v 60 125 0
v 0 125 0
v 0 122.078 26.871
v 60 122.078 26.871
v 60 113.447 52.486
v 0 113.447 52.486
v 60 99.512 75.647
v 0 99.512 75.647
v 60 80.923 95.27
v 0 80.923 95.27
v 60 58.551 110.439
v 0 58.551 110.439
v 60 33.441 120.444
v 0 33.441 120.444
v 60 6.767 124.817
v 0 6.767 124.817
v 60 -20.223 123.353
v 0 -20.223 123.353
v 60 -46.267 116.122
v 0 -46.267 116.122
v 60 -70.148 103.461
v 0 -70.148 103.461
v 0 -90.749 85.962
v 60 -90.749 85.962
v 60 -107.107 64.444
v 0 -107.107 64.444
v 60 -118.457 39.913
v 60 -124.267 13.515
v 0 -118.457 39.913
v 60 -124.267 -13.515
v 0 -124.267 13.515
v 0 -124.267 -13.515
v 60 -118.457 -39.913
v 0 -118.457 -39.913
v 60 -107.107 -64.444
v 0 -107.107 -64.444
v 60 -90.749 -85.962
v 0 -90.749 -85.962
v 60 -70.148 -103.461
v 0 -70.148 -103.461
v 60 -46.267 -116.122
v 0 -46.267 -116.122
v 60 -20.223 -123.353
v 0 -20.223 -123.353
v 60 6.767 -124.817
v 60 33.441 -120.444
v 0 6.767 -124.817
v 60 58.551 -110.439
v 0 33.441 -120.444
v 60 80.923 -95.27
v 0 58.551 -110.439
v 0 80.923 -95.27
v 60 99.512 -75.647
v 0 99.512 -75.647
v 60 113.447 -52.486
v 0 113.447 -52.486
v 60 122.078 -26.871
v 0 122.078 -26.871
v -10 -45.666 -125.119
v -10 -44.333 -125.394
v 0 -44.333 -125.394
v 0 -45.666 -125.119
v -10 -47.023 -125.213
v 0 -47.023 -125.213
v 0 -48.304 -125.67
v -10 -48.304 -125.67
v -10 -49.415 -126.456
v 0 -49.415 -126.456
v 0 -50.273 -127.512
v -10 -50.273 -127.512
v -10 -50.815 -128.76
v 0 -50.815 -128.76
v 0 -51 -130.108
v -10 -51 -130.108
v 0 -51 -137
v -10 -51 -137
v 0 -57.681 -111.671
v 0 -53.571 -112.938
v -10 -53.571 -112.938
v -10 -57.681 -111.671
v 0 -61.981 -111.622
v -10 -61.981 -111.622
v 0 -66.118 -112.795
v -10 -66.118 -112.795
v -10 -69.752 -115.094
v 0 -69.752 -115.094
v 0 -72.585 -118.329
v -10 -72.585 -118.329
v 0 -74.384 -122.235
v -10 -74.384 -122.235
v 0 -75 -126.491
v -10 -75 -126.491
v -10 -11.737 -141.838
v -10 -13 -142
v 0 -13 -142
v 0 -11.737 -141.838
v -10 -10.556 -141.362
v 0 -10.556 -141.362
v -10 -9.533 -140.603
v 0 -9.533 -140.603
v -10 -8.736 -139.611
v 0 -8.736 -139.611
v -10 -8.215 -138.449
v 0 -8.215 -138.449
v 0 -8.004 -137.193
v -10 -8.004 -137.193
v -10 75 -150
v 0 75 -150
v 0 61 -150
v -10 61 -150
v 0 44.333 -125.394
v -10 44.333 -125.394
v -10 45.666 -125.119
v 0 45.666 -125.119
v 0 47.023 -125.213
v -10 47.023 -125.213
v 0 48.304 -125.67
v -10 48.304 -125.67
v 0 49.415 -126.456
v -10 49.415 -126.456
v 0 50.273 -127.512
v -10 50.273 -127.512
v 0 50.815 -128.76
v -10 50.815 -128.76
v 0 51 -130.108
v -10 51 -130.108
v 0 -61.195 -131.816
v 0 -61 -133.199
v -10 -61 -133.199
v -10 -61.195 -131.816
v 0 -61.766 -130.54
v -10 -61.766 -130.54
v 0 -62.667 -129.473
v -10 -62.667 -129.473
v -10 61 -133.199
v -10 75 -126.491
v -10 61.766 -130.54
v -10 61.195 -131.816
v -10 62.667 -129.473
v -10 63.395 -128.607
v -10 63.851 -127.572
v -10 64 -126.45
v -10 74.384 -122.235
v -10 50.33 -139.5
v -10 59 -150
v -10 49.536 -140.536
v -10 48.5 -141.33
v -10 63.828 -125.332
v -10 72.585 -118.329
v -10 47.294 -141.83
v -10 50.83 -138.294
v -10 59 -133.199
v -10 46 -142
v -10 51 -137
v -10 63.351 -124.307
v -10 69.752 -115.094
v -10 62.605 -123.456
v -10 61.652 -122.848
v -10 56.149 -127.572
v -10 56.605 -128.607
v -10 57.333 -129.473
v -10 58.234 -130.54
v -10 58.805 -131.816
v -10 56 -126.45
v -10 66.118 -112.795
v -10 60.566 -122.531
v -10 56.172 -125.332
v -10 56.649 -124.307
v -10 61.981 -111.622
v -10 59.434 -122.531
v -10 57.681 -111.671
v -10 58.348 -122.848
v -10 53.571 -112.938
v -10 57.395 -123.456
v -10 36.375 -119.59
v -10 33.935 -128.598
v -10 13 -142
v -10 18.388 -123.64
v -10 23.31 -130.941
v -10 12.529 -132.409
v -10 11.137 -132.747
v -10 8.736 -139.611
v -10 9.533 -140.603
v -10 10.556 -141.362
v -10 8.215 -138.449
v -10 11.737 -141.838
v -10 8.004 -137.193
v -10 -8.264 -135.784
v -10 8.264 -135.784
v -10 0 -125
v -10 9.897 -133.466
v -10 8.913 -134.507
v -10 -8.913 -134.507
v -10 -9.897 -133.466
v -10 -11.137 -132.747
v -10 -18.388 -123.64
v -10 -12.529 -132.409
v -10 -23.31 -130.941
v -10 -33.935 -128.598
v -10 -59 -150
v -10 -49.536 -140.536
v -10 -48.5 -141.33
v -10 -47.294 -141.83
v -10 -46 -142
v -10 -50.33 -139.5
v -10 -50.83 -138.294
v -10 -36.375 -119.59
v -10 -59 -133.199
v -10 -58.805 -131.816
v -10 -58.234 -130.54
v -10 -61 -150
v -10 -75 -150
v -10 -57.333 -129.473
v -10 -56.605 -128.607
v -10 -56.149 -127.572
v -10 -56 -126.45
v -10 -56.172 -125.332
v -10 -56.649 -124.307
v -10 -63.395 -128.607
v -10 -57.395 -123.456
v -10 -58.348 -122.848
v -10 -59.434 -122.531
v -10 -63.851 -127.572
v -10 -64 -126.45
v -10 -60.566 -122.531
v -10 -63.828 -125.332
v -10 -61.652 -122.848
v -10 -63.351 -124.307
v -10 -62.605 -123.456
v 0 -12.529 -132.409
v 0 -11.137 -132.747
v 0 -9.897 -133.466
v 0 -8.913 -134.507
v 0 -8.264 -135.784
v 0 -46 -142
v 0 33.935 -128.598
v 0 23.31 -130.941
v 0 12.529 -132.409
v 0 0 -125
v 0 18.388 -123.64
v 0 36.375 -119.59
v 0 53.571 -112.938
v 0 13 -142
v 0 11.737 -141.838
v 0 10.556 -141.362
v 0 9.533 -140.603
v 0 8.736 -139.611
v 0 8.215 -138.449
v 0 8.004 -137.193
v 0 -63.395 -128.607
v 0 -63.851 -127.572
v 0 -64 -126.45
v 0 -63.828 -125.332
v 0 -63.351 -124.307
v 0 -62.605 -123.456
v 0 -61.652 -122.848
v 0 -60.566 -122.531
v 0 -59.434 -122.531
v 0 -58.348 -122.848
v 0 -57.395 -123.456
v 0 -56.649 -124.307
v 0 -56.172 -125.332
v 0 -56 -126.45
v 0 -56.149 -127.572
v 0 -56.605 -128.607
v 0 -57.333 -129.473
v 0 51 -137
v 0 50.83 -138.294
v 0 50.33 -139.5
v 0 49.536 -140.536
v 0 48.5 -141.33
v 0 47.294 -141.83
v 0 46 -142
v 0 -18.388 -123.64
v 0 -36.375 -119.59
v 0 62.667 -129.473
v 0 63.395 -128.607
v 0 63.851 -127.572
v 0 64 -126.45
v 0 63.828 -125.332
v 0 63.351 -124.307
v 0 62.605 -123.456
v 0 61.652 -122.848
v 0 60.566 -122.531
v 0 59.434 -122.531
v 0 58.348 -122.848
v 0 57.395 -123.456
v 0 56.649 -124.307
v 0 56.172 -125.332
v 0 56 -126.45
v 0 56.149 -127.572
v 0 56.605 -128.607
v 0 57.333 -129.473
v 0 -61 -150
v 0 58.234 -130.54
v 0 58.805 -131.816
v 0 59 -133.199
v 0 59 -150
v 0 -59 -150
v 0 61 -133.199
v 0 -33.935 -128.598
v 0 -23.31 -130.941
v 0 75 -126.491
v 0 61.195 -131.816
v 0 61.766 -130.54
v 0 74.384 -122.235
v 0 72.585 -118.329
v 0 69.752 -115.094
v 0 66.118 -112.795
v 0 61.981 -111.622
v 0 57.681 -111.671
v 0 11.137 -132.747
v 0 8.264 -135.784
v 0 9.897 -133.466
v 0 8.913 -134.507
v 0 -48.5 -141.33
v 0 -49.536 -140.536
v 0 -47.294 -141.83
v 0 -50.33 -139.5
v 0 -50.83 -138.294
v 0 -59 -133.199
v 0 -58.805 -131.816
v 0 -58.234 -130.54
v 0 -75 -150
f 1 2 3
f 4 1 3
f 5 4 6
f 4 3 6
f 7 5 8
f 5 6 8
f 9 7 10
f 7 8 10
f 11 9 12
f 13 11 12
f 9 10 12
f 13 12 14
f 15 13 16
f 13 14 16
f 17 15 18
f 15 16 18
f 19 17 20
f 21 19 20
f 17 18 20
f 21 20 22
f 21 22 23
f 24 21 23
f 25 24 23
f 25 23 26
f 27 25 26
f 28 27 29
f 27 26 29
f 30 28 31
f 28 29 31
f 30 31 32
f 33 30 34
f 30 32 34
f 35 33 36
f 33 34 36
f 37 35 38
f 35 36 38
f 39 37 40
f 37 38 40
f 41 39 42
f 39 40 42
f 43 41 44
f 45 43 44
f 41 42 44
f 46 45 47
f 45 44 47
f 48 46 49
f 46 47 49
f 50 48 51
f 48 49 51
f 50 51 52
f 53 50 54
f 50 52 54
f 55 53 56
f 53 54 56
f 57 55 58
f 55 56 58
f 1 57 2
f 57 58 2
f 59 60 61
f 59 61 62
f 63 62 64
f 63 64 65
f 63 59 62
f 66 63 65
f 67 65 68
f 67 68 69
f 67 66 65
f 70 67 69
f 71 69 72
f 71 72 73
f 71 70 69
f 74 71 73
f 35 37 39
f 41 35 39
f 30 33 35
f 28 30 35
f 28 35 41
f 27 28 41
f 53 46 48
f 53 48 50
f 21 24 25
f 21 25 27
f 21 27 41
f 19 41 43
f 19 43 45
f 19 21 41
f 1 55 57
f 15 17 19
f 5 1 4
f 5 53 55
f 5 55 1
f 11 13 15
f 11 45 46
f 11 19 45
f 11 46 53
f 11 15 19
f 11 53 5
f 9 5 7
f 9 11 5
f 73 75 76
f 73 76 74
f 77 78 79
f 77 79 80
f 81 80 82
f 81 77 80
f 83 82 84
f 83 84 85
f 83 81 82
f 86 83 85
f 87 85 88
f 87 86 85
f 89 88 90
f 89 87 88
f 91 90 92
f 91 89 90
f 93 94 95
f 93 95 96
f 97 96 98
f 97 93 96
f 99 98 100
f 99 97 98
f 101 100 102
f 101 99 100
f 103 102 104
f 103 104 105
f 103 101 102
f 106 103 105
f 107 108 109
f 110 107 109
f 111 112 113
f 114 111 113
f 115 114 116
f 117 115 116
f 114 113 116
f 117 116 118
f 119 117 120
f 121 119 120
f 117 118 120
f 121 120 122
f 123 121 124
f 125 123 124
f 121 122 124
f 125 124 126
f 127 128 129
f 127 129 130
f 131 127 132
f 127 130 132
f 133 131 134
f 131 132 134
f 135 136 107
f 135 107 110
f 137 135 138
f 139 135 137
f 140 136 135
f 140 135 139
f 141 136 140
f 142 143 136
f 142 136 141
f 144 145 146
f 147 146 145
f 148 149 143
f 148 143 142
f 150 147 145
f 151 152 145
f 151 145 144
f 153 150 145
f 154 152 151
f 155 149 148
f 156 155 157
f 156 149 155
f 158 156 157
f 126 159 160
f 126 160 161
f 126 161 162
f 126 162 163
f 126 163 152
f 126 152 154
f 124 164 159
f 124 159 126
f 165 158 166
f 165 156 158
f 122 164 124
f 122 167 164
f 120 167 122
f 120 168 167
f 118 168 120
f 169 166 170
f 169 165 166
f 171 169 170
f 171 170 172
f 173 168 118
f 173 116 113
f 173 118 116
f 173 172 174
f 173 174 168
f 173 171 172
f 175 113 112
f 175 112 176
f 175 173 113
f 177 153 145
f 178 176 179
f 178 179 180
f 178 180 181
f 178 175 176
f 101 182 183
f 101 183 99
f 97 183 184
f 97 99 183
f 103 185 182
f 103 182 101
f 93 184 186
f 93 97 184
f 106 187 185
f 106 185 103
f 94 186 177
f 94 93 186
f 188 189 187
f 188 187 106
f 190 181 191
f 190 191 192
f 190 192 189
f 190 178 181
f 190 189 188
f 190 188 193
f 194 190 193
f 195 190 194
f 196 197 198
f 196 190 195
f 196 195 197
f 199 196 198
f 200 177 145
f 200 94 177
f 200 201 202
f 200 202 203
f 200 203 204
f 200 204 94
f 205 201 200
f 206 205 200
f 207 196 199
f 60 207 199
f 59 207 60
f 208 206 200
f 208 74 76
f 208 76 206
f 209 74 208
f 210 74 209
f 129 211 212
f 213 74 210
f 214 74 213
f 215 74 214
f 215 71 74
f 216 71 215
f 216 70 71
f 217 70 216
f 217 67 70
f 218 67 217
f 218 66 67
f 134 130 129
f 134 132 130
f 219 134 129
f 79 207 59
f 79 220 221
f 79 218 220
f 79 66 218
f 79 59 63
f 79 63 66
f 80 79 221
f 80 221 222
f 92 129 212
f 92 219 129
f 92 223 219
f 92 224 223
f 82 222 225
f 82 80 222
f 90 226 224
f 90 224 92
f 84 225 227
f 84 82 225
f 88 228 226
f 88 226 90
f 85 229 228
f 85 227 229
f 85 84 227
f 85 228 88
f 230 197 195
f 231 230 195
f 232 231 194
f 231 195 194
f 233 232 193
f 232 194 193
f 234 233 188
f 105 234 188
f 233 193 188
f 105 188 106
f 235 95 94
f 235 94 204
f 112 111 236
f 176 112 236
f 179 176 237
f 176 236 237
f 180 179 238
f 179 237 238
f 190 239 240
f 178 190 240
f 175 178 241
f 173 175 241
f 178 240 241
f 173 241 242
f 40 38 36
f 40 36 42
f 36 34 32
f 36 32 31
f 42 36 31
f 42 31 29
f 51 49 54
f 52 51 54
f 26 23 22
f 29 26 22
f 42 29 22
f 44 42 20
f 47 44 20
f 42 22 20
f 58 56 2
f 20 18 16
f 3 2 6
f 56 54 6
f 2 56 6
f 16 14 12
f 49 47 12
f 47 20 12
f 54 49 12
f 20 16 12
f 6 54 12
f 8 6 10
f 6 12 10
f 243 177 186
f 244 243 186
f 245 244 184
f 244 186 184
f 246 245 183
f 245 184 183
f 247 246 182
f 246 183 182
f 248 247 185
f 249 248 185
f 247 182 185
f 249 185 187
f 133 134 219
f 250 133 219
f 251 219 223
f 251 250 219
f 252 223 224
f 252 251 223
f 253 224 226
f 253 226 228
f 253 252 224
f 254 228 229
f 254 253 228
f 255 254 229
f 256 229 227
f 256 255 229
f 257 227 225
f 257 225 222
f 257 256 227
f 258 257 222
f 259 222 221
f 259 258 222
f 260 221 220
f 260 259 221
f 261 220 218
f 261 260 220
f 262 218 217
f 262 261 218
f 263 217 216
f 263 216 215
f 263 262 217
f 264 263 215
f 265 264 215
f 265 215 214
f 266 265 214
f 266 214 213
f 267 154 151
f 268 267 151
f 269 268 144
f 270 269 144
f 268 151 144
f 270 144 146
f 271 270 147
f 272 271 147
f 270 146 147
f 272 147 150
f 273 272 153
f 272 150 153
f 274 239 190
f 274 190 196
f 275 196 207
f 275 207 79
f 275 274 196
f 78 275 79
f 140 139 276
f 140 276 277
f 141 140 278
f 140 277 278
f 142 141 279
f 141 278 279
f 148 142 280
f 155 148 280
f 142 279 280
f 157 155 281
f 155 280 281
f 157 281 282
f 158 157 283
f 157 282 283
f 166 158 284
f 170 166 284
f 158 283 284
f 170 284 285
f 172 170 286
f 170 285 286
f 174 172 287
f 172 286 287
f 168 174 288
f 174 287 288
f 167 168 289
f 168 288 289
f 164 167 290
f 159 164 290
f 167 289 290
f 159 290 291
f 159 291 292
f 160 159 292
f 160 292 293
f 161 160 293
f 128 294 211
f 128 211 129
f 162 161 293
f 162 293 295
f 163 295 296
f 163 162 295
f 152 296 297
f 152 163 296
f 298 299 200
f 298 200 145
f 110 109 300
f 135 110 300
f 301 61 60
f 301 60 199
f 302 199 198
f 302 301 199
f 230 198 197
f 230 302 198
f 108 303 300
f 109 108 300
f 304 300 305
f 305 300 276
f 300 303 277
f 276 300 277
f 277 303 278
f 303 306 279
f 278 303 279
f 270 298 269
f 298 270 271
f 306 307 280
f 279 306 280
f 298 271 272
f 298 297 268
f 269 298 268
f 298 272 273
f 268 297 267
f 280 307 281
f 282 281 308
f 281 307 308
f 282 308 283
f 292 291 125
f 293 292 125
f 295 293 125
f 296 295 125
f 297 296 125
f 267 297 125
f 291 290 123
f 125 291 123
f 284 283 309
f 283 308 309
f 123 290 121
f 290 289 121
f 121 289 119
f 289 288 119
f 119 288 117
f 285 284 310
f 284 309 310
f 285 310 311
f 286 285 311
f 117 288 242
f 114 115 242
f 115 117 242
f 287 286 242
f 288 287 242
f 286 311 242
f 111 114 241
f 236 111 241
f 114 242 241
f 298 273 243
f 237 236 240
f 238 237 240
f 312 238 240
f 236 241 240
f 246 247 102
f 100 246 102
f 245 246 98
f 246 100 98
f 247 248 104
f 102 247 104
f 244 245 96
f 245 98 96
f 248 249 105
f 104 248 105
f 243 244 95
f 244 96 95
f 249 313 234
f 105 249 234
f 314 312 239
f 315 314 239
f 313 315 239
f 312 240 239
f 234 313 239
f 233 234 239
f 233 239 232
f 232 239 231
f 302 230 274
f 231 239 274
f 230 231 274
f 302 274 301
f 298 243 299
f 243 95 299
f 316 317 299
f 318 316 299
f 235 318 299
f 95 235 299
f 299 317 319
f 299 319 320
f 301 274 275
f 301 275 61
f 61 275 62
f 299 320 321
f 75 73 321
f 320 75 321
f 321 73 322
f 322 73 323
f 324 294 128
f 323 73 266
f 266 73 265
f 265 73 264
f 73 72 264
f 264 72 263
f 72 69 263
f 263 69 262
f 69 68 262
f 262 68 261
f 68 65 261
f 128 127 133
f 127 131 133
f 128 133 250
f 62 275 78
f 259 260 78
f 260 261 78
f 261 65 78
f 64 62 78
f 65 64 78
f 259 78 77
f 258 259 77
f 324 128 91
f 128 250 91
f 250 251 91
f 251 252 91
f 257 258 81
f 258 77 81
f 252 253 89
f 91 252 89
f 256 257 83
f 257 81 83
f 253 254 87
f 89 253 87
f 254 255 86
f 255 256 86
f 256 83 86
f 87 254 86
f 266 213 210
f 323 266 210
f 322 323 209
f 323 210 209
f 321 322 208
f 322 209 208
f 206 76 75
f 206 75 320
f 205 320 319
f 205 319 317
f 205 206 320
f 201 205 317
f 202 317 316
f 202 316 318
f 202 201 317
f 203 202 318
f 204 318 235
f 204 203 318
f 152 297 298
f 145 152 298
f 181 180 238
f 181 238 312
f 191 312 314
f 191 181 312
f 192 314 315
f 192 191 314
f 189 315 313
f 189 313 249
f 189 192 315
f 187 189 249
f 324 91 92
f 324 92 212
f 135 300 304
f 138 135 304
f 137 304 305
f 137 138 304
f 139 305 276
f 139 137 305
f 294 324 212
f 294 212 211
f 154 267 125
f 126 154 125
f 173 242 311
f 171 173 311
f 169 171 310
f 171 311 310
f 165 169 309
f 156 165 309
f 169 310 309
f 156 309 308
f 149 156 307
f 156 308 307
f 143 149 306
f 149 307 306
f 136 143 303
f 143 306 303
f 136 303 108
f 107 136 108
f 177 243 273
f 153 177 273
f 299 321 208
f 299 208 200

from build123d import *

# Parameters (mm, degrees)
F0_R        = 125
F1_DEPTH    = 60
F3_DEPTH    = 10
F4_T1_DEPTH = 10
F4_T3_DEPTH = 24.1761029315


# Not quite as in the source:
# - a fillet or chamfer that OpenCascade refuses, or shapes differently, is made with other operations: its cross-section is extruded or revolved along the edge and cut away or added
# - a feature names something its author has since deleted; it is built from what else it names


with BuildPart() as f1:
    # F0 (on Right) → F1 (new body)
    with BuildSketch(Plane.YZ):
        Circle(F0_R)
    extrude(amount=F1_DEPTH)


with BuildPart() as f3:
    # F2 (on face) → F3 (new body)
    with BuildSketch(Plane(origin=(0, 0, 0), x_dir=(0, -1, 0), z_dir=(-1, 0, 0))):
        with BuildLine():
            ThreePointArc((0, -125), (-27.4562289572, -121.9473472096), (-53.5714285714, -112.9384878632))
            ThreePointArc((-53.5714285714, -112.9384878632), (-68.0178372574, -113.8137925858), (-75, -126.4911064067))
            Line((-75, -126.4911064067), (-75, -150))
            Line((-75, -150), (-61, -150))
            Line((-61, -150), (-61, -130.3640897529))
            ThreePointArc((-61, -130.3640897529), (-60, -122.4911064067), (-59, -130.3640897529))
            Line((-59, -130.3640897529), (-59, -150))
            Line((-59, -150), (0, -150))
            Line((0, -150), (0, -125))
        make_face()
        with BuildLine():
            Line((-8.00000038, -141.99999962), (-50.99999962, -141.99999962))
            Line((-50.99999962, -141.99999962), (-50.99999962, -130.3640897529))
            Line((-50.99999962, -130.3640897529), (-50.99999962, -122.8332208315))
            ThreePointArc((-50.99999962, -122.8332208315), (-29.914564521, -129.5921252646), (-8.00000038, -132.7591808313))
            Line((-8.00000038, -132.7591808313), (-8.00000038, -141.99999962))
        make_face(mode=Mode.SUBTRACT)
    extrude(amount=F3_DEPTH)

    # F4: fillet of radius 5 on 6 edges, made by hand

    # F4_s2 → F4_t1 (join)
    with BuildSketch(Plane.YZ.offset(-10)):
        with BuildLine():
            ThreePointArc((44.3333329717, -125.3936030613), (48.8867509739, -126.0251653767), (50.99999962, -130.1076482757))
            Line((50.99999962, -130.1076482757), (50.99999962, -122.8332208315))
            ThreePointArc((50.99999962, -122.8332208315), (47.6838543435, -124.1581658048), (44.3333329717, -125.3936030613))
        make_face()
        with BuildLine():
            ThreePointArc((50.99999962, -136.99999962), (49.535533526, -140.535533526), (45.99999962, -141.99999962))
            Line((45.99999962, -141.99999962), (50.99999962, -141.99999962))
            Line((50.99999962, -141.99999962), (50.99999962, -136.99999962))
        make_face()
        with BuildLine():
            ThreePointArc((13.00000038, -141.99999962), (9.464466474, -140.535533526), (8.00000038, -136.99999962))
            Line((8.00000038, -136.99999962), (8.00000038, -141.99999962))
            Line((8.00000038, -141.99999962), (13.00000038, -141.99999962))
        make_face()
        with BuildLine():
            ThreePointArc((12.5289858748, -132.4085518916), (9.3016850523, -134.0214301028), (8.00000038, -137.3863169861))
            Line((8.00000038, -137.3863169861), (8.00000038, -132.7591808313))
            ThreePointArc((8.00000038, -132.7591808313), (10.2659901775, -132.6032033804), (12.5289858748, -132.4085518916))
        make_face()
    extrude(amount=F4_T1_DEPTH)

    # F4_s4 → F4_t3 (cut)
    with BuildSketch(Plane.YZ.offset(-17.0880514658)):
        with BuildLine():
            ThreePointArc((57.3333333333, -129.4725303767), (58.5643546459, -131.1580688869), (59, -133.1993103392))
            Line((59, -133.1993103392), (59, -130.3640897529))
            ThreePointArc((59, -130.3640897529), (58.1132486541, -130.018168833), (57.3333333333, -129.4725303767))
        make_face()
        with BuildLine():
            ThreePointArc((61, -133.1993103392), (61.4356453541, -131.1580688869), (62.6666666667, -129.4725303767))
            ThreePointArc((62.6666666667, -129.4725303767), (61.8867513459, -130.018168833), (61, -130.3640897529))
            Line((61, -130.3640897529), (61, -133.1993103392))
        make_face()
    extrude(amount=F4_T3_DEPTH, mode=Mode.SUBTRACT)

    # F5: F3 across face


with BuildPart() as f3_1:
    add(f3.part)
    add(f3.part.mirror(Plane(origin=(-5, 0, -137.5), x_dir=(1, 0, 0), z_dir=(0, -1, 0))))


solid = Compound([f1.part, f3_1.part])
